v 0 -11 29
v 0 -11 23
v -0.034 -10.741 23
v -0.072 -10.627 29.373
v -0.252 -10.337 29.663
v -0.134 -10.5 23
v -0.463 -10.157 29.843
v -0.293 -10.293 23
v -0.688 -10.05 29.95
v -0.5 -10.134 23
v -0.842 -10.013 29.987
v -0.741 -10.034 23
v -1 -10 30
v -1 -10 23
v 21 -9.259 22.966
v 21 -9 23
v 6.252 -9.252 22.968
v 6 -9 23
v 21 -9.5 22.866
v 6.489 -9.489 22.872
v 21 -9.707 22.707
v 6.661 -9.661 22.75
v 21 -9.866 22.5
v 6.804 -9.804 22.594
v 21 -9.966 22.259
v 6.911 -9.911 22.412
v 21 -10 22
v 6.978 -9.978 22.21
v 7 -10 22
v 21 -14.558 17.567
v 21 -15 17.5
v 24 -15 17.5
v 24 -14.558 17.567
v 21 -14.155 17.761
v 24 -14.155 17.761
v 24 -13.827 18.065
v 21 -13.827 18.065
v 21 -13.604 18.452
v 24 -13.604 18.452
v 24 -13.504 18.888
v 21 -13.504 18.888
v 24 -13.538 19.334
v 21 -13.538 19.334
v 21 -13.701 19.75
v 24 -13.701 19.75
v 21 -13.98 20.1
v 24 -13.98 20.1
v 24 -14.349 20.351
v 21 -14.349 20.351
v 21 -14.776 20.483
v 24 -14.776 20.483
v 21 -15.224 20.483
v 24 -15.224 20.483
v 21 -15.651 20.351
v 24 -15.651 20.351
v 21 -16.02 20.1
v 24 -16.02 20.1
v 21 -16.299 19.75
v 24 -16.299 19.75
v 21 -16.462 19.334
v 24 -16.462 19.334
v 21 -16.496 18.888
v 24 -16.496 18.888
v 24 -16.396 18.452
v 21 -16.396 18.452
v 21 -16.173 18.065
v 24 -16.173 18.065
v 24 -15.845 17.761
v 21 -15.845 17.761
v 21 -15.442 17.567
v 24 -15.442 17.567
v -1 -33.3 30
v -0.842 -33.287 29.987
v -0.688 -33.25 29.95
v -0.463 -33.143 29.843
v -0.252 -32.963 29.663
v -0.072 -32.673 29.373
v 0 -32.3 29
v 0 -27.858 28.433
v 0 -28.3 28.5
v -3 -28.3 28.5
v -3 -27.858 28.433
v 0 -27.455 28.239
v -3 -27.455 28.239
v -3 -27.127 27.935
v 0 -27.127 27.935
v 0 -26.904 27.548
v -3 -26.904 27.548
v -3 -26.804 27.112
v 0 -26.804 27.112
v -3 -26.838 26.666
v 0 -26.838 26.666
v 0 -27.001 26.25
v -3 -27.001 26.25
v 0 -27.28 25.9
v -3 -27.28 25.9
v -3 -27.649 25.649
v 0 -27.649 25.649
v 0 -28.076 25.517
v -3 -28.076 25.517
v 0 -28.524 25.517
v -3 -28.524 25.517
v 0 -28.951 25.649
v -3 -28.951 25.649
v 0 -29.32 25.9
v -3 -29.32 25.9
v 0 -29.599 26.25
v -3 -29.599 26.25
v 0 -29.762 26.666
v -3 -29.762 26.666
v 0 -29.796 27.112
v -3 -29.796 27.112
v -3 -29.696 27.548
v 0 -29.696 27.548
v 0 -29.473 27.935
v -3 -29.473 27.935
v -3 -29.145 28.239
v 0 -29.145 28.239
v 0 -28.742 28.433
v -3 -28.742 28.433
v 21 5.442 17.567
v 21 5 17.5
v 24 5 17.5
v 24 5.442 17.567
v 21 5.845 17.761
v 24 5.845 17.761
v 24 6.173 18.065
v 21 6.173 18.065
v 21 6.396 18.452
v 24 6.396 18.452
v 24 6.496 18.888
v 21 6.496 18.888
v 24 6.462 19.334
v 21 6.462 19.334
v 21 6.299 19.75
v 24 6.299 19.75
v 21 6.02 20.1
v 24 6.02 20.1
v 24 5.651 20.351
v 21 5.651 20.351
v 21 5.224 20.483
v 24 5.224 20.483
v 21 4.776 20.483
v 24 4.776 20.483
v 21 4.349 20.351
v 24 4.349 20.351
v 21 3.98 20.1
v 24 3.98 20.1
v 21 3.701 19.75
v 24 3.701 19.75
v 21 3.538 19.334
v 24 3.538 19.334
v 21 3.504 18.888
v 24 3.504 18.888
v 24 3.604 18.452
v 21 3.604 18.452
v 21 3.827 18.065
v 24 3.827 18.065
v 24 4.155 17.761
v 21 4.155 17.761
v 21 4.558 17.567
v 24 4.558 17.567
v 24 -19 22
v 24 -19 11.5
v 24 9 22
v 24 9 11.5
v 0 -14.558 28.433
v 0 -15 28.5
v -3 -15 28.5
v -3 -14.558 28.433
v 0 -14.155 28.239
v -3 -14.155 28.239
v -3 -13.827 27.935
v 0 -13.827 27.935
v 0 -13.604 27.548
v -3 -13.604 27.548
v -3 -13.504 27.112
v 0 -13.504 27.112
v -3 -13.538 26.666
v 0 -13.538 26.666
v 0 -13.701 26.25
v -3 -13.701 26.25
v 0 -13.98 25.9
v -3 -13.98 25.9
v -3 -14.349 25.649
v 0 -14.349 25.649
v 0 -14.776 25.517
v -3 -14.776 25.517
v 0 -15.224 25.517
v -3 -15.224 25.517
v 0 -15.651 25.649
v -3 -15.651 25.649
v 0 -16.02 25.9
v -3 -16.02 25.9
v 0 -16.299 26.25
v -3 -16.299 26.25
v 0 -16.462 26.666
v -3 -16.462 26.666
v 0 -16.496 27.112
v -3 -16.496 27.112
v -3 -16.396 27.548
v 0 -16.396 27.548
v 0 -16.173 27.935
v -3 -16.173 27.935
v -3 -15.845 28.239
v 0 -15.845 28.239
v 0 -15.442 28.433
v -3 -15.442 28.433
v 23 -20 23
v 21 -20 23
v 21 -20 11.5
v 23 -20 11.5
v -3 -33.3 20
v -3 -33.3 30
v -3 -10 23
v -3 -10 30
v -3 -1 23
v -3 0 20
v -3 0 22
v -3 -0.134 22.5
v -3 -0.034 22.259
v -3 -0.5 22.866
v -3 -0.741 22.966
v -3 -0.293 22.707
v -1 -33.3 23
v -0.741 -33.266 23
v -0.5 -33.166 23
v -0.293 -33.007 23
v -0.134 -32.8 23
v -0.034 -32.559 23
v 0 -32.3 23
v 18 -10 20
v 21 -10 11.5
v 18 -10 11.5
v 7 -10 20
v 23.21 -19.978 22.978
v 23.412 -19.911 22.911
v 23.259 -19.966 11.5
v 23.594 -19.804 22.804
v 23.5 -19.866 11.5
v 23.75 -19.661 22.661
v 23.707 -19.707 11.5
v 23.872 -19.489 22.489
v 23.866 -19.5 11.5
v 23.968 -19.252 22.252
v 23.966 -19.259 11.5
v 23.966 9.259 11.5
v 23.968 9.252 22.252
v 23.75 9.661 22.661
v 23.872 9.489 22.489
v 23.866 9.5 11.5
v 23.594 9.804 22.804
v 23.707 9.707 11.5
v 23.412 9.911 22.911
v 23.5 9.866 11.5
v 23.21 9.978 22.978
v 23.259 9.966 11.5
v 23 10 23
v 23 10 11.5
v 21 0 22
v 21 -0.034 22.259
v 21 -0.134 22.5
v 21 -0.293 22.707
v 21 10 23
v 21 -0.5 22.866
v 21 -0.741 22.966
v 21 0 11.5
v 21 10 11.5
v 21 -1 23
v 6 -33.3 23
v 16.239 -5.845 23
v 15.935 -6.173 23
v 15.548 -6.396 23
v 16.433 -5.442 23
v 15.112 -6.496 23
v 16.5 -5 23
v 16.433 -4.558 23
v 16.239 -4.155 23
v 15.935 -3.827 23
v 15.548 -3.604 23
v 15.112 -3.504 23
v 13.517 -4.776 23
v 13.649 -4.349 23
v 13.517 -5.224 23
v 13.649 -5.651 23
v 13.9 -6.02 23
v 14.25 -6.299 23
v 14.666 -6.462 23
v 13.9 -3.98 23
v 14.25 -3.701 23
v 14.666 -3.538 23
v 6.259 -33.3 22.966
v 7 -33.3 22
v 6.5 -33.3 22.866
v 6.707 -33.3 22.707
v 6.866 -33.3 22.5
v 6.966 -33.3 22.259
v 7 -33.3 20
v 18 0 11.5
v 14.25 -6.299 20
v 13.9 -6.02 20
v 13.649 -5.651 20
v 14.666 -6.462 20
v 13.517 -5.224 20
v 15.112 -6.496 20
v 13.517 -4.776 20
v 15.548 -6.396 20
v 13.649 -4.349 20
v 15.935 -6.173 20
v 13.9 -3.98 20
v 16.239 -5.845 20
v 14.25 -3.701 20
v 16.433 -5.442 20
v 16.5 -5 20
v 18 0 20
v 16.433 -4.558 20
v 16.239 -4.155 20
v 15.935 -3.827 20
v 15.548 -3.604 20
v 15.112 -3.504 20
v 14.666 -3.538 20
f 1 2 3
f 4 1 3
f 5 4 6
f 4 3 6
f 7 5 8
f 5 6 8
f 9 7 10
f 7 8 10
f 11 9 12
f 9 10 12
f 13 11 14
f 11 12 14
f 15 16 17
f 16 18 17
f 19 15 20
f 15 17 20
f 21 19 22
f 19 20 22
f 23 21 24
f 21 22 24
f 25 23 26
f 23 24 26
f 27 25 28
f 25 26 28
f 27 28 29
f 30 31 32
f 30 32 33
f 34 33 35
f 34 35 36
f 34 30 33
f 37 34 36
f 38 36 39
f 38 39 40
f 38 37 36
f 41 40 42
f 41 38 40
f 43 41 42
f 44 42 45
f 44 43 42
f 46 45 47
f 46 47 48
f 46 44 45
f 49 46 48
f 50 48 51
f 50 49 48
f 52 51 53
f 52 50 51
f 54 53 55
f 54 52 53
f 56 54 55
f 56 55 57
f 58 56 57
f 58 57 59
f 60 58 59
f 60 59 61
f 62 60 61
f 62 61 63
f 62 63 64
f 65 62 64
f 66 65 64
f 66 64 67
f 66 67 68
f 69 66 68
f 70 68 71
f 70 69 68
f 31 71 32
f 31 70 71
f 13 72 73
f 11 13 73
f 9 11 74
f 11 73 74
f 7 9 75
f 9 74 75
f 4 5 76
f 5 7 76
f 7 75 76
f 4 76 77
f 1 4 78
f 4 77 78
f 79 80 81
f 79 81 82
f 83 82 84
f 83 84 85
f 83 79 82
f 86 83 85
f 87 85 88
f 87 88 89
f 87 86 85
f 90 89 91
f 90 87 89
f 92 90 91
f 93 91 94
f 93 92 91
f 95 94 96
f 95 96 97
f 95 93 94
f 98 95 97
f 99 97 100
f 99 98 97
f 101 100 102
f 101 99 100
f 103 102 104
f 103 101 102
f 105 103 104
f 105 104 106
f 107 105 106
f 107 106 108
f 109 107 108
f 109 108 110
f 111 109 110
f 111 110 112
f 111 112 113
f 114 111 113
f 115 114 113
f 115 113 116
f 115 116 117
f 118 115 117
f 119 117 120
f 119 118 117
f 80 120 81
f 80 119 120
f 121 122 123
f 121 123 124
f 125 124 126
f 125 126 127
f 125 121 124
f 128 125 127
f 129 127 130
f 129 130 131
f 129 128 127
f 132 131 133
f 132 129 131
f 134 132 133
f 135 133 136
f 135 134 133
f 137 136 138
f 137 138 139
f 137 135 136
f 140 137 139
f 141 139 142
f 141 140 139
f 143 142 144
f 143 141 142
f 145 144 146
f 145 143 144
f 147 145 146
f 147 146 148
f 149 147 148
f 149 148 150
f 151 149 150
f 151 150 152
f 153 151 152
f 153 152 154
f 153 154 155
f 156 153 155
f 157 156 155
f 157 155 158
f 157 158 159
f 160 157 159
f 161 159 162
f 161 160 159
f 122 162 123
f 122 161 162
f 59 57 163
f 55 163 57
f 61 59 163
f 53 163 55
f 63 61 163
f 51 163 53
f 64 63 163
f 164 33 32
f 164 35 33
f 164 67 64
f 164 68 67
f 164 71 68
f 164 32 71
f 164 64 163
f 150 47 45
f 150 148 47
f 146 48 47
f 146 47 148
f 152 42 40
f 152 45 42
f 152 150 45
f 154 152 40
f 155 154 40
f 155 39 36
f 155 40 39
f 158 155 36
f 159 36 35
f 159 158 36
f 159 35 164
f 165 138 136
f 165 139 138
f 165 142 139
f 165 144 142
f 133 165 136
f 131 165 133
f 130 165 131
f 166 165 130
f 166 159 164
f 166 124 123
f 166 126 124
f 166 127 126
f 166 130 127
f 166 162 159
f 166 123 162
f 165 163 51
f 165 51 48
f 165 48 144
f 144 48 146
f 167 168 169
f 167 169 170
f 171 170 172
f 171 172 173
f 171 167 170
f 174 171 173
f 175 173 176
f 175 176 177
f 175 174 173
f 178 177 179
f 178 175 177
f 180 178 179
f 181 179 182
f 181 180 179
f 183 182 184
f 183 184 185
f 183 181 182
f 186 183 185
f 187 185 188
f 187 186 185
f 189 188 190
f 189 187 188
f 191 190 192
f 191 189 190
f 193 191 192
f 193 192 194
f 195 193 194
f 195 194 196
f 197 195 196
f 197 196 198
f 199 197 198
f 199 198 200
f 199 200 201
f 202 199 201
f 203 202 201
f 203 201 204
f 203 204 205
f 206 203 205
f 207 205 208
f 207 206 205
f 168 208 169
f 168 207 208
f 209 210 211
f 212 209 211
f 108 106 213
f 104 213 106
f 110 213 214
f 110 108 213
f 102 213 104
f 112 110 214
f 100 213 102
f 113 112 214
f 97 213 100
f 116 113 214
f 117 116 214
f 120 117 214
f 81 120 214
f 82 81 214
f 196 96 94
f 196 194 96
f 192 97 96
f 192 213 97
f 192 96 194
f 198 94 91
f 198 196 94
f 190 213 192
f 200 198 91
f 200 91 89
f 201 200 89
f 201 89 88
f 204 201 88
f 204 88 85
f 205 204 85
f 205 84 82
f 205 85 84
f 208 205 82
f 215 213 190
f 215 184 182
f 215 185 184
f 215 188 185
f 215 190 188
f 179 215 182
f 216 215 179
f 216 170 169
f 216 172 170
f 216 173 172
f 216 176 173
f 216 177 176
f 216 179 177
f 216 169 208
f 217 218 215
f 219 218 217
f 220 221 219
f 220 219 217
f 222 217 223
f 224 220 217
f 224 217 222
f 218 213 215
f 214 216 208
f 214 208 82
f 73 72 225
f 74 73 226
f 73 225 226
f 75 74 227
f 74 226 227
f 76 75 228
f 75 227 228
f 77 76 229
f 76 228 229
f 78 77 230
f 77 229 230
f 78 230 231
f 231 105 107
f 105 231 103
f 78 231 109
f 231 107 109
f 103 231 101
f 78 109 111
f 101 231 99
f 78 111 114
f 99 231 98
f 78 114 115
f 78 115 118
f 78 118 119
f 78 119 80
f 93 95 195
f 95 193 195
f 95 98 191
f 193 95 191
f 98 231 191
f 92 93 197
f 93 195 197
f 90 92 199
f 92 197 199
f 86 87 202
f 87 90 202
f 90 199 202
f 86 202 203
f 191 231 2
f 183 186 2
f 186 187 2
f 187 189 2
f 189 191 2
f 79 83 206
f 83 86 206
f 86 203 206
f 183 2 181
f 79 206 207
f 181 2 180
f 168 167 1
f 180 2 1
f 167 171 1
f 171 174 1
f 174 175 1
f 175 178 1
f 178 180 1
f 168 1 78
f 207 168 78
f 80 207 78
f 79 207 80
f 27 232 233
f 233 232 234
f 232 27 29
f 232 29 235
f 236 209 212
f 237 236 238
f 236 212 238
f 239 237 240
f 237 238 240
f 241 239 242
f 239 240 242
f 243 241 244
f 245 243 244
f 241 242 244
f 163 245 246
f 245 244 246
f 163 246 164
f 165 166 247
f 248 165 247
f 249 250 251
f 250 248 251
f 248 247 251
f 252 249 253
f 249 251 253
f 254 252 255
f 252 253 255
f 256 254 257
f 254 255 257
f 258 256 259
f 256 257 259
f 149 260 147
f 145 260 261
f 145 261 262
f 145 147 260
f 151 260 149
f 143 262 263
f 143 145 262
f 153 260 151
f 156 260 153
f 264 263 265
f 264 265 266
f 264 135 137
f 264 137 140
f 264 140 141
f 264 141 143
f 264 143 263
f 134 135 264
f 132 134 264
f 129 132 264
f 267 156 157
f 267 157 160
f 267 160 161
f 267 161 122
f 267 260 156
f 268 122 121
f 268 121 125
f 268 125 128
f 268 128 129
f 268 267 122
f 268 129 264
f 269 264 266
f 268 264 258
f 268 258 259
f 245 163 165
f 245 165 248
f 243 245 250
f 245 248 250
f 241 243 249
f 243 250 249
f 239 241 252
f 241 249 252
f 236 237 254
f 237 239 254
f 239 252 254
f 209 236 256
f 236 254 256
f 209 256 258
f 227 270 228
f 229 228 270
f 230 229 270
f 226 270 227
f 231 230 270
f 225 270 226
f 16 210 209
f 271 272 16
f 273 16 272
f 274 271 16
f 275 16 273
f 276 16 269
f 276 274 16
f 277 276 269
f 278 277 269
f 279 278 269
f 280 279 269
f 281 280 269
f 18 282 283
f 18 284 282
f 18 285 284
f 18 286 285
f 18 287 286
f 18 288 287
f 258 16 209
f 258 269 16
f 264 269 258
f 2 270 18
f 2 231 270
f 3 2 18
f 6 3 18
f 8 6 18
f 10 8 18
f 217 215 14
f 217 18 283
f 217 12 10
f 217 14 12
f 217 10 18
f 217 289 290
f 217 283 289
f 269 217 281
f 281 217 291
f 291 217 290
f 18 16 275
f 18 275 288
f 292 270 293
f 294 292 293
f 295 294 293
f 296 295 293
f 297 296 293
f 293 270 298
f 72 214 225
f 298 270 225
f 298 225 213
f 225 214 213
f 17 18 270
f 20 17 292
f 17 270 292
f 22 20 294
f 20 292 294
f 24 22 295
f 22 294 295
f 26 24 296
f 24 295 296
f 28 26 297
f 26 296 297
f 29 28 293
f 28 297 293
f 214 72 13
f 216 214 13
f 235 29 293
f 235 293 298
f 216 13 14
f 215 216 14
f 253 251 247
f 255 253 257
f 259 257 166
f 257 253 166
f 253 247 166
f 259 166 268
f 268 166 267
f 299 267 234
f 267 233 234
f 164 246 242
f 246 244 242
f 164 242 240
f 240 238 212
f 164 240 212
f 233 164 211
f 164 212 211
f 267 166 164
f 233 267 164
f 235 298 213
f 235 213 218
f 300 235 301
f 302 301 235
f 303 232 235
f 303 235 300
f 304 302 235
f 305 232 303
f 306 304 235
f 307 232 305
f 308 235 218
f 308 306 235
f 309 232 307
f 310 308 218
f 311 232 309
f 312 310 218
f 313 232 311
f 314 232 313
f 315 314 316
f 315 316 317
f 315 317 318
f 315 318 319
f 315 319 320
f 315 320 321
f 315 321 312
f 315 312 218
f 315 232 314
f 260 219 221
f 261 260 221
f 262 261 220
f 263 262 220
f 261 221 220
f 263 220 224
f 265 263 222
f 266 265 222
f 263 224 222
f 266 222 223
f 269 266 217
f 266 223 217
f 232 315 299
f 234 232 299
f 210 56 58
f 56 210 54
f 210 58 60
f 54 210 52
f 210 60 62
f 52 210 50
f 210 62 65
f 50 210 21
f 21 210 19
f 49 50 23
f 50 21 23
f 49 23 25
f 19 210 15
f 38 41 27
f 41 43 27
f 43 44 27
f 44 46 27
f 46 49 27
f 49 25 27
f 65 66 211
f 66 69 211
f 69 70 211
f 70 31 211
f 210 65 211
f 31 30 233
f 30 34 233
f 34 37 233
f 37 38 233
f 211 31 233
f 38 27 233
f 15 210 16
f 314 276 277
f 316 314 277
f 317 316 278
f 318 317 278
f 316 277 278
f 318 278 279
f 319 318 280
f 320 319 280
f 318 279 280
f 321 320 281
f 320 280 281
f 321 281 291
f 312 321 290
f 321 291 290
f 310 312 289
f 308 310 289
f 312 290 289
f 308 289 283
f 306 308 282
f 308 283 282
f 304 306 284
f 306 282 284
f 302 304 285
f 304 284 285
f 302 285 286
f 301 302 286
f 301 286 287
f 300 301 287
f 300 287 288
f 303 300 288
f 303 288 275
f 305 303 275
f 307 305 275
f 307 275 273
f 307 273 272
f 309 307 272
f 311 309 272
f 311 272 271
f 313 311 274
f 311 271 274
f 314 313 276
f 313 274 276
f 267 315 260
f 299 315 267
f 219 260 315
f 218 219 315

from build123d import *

# Parameters (mm, degrees)
CROQUIS1_W              = 23
CROQUIS1_H              = 33.3
SALIENTE_EXTRUIR2_DEPTH = 7
CROQUIS3_W              = 4
CROQUIS3_H              = 19
CORTAR_EXTRUIR1_DEPTH   = 42.071766458
CROQUIS7_R              = 1.5
SALIENTE_EXTRUIR3_DEPTH = 3
CROQUIS8_W              = 18
CROQUIS8_H              = 10
CROQUIS8_R              = 1.5
SALIENTE_EXTRUIR5_DEPTH = 3
SALIENTE_EXTRUIR6_START = -1
CROQUIS9_W              = 18
CROQUIS9_H              = 10
CROQUIS9_R              = 1.5
SALIENTE_EXTRUIR6_DEPTH = 1
CROQUIS10_W             = 23
CROQUIS10_H             = 10
SALIENTE_EXTRUIR7_DEPTH = 3
CROQUIS11_W             = 19
CROQUIS11_H             = 38
CORTAR_EXTRUIR5_DEPTH   = 57.449003534
CROQUIS15_W             = 7
CROQUIS15_H             = 10
CORTAR_EXTRUIR8_DEPTH   = 58.475994989
CROQUIS16_W             = 7
CROQUIS16_H             = 16
CORTAR_EXTRUIR9_DEPTH   = 1
CROQUIS18_W             = 23
CROQUIS18_H             = 10
CROQUIS18_R             = 1.5
SALIENTE_EXTRUIR8_DEPTH = 3
REDONDEO1_R             = 1
CROQUIS19_W             = 2
CROQUIS19_H             = 11.5
CORTAR_EXTRUIR10_DEPTH  = 67.516839973
CROQUIS20_W             = 11.5
CROQUIS20_H             = 11
CORTAR_EXTRUIR11_DEPTH  = 60.929041374


with BuildPart() as part:
    # Croquis1 → Saliente-Extruir2 (new body)
    with BuildSketch(Plane(origin=(0, 0, 0), x_dir=(0, 0, -1), z_dir=(1, 0, 0))):
        with Locations((-11.5, -16.65)):
            Rectangle(CROQUIS1_W, CROQUIS1_H)
    extrude(amount=SALIENTE_EXTRUIR2_DEPTH)

    # Croquis3 → Cortar-Extruir1 (cut, through all)
    with BuildSketch(Plane(origin=(0, 0, 0), x_dir=(1, 0, 0), z_dir=(0, 1, 0))):
        with Locations((5, -10.5)):
            Rectangle(CROQUIS3_W, CROQUIS3_H)
    extrude(amount=-CORTAR_EXTRUIR1_DEPTH, mode=Mode.SUBTRACT)



with BuildPart() as body_2:
    # Croquis7 → Saliente-Extruir3 (new body)
    with BuildSketch(Plane.ZY):
        Polygon((-7, 0), (-7, -33.3), (0, -33.3), (0, -44.3), (23, -44.3), (23, -33.3), (30, -33.3), (30, 0), align=None)
        with Locations((-4, -28.3)):
            Circle(CROQUIS7_R, mode=Mode.SUBTRACT)
        with Locations((-4, -15)):
            Circle(CROQUIS7_R, mode=Mode.SUBTRACT)
        with Locations((27, -15)):
            Circle(CROQUIS7_R, mode=Mode.SUBTRACT)
        with Locations((27, -28.3)):
            Circle(CROQUIS7_R, mode=Mode.SUBTRACT)
        with Locations((19, -40.3)):
            Circle(CROQUIS7_R, mode=Mode.SUBTRACT)
        with Locations((4, -40.3)):
            Circle(CROQUIS7_R, mode=Mode.SUBTRACT)
    extrude(amount=SALIENTE_EXTRUIR3_DEPTH)


with BuildPart() as part_1:
    add(part.part)

    add(body_2.part)  # Saliente-Extruir5 merges body 2
    # Croquis8 → Saliente-Extruir5 (add)
    with BuildSketch(Plane.XY.offset(23)):
        with Locations((9, -5)):
            Rectangle(CROQUIS8_W, CROQUIS8_H)
        with Locations((15, -5)):
            Circle(CROQUIS8_R, mode=Mode.SUBTRACT)
        with Locations((3, -5)):
            Circle(CROQUIS8_R, mode=Mode.SUBTRACT)
    extrude(amount=-SALIENTE_EXTRUIR5_DEPTH)

    # Croquis9 → Saliente-Extruir6 (add)
    with BuildSketch(Plane(origin=(0, 0, 0), x_dir=(-1, 0, 0), z_dir=(0, 0, -1)).offset(SALIENTE_EXTRUIR6_START)):
        with Locations((-9, -5)):
            Rectangle(CROQUIS9_W, CROQUIS9_H)
        with Locations(Location((-15, -5, 0), (0, 0, 180))):
            Circle(CROQUIS9_R, mode=Mode.SUBTRACT)
    extrude(amount=SALIENTE_EXTRUIR6_DEPTH)

    # Croquis10 → Saliente-Extruir7 (add)
    with BuildSketch(Plane(origin=(18, 0, 0), x_dir=(0, 0, -1), z_dir=(1, 0, 0))):
        with Locations((-11.5, -5)):
            Rectangle(CROQUIS10_W, CROQUIS10_H)
    extrude(amount=SALIENTE_EXTRUIR7_DEPTH)

    # Croquis11 → Cortar-Extruir5 (cut, through all)
    with BuildSketch(Plane(origin=(3, 0, 0), x_dir=(0, 0, -1), z_dir=(1, 0, 0))):
        with Locations((-10.5, -19)):
            Rectangle(CROQUIS11_W, CROQUIS11_H)
    extrude(amount=-CORTAR_EXTRUIR5_DEPTH, mode=Mode.SUBTRACT)

    # Croquis15 → Cortar-Extruir8 (cut, through all)
    with BuildSketch(Plane(origin=(0, 0, 0), x_dir=(0, 0, -1), z_dir=(1, 0, 0))):
        with Locations((-26.5, -5)):
            Rectangle(CROQUIS15_W, CROQUIS15_H)
        with Locations((3.5, -5)):
            Rectangle(CROQUIS15_W, CROQUIS15_H)
    extrude(amount=-CORTAR_EXTRUIR8_DEPTH, mode=Mode.SUBTRACT)

    # Croquis16 → Cortar-Extruir9 (cut)
    with BuildSketch(Plane(origin=(0, 0, 0), x_dir=(-1, 0, 0), z_dir=(0, 0, -1))):
        with Locations((-3.5, -25.3)):
            Rectangle(CROQUIS16_W, CROQUIS16_H)
    extrude(amount=-CORTAR_EXTRUIR9_DEPTH, mode=Mode.SUBTRACT)

    # Croquis18 → Saliente-Extruir8 (add)
    # profile 1 of 3: a face of its own
    with BuildSketch(Plane(origin=(21, 0, 0), x_dir=(0, 0, -1), z_dir=(1, 0, 0))):
        with Locations((-11.5, 5)):
            Rectangle(CROQUIS18_W, CROQUIS18_H)
        with Locations((-19, 5)):
            Circle(CROQUIS18_R, mode=Mode.SUBTRACT)
        with Locations((-4, 5)):
            Circle(CROQUIS18_R, mode=Mode.SUBTRACT)
    # profile 2 of 3: a face of its own
    with BuildSketch(Plane(origin=(21, 0, 0), x_dir=(0, 0, -1), z_dir=(1, 0, 0))):
        with Locations((-11.5, -5)):
            Rectangle(CROQUIS18_W, CROQUIS18_H)
    # profile 3 of 3: a face of its own
    with BuildSketch(Plane(origin=(21, 0, 0), x_dir=(0, 0, -1), z_dir=(1, 0, 0))):
        with Locations((-11.5, -15)):
            Rectangle(CROQUIS18_W, CROQUIS18_H)
        with Locations((-4, -15)):
            Circle(CROQUIS18_R, mode=Mode.SUBTRACT)
        with Locations((-19, -15)):
            Circle(CROQUIS18_R, mode=Mode.SUBTRACT)
    extrude(amount=SALIENTE_EXTRUIR8_DEPTH)

    # Redondeo1
    # the kernel refuses this fillet: 1 mm, written as the material it takes off along each edge
    with BuildSketch(Plane(origin=(0, -33.3, 30), x_dir=(-1, 0, 0), z_dir=(0, 1, 0)), Plane(origin=(7, -33.3, 23), x_dir=(-1, 0, 0), z_dir=(0, 1, 0))) as redondeo1_piece_1:
        with BuildLine():
            CenterArc((REDONDEO1_R, -REDONDEO1_R), REDONDEO1_R, 90, 90)
            Line((0, -REDONDEO1_R), (-REDONDEO1_R * 0.02, -REDONDEO1_R))
            Line((-REDONDEO1_R * 0.02, -REDONDEO1_R), (-REDONDEO1_R * 0.02, REDONDEO1_R * 0.02))
            Line((-REDONDEO1_R * 0.02, REDONDEO1_R * 0.02), (REDONDEO1_R, REDONDEO1_R * 0.02))
            Line((REDONDEO1_R, REDONDEO1_R * 0.02), (REDONDEO1_R, 0))
        make_face()
    extrude(amount=23.3, mode=Mode.SUBTRACT)
    with BuildSketch(Plane(origin=(0, -10, 23), x_dir=(-1, 0, 0), z_dir=(0, 0, 1)), Plane(origin=(0, -10, -7), x_dir=(-1, 0, 0), z_dir=(0, 0, 1)), Plane(origin=(0, -33.3, -7), x_dir=(0, 1, 0), z_dir=(0, 0, 1))) as redondeo1_piece_2:
        with BuildLine():
            CenterArc((REDONDEO1_R, REDONDEO1_R), REDONDEO1_R, 180, 90)
            Line((0, REDONDEO1_R), (-REDONDEO1_R * 0.02, REDONDEO1_R))
            Line((-REDONDEO1_R * 0.02, REDONDEO1_R), (-REDONDEO1_R * 0.02, -REDONDEO1_R * 0.02))
            Line((-REDONDEO1_R * 0.02, -REDONDEO1_R * 0.02), (REDONDEO1_R, -REDONDEO1_R * 0.02))
            Line((REDONDEO1_R, -REDONDEO1_R * 0.02), (REDONDEO1_R, 0))
        make_face()
    extrude(amount=7, mode=Mode.SUBTRACT)
    with BuildSketch(Plane(origin=(24, 10, 23), x_dir=(0, 0, -1), z_dir=(0, -1, 0)), Plane(origin=(24, 10, 0), x_dir=(-1, 0, 0), z_dir=(0, -1, 0))) as redondeo1_piece_3:
        with BuildLine():
            CenterArc((REDONDEO1_R, -REDONDEO1_R), REDONDEO1_R, 90, 90)
            Line((0, -REDONDEO1_R), (-REDONDEO1_R * 0.02, -REDONDEO1_R))
            Line((-REDONDEO1_R * 0.02, -REDONDEO1_R), (-REDONDEO1_R * 0.02, REDONDEO1_R * 0.02))
            Line((-REDONDEO1_R * 0.02, REDONDEO1_R * 0.02), (REDONDEO1_R, REDONDEO1_R * 0.02))
            Line((REDONDEO1_R, REDONDEO1_R * 0.02), (REDONDEO1_R, 0))
        make_face()
    extrude(amount=30, mode=Mode.SUBTRACT)
    with BuildSketch(Plane(origin=(24, 10, 0), x_dir=(-1, 0, 0), z_dir=(0, 0, 1)), Plane(origin=(0, -44.3, 0), x_dir=(0, 1, 0), z_dir=(0, 0, 1))) as redondeo1_piece_4:
        with BuildLine():
            CenterArc((REDONDEO1_R, REDONDEO1_R), REDONDEO1_R, 180, 90)
            Line((0, REDONDEO1_R), (-REDONDEO1_R * 0.02, REDONDEO1_R))
            Line((-REDONDEO1_R * 0.02, REDONDEO1_R), (-REDONDEO1_R * 0.02, -REDONDEO1_R * 0.02))
            Line((-REDONDEO1_R * 0.02, -REDONDEO1_R * 0.02), (REDONDEO1_R, -REDONDEO1_R * 0.02))
            Line((REDONDEO1_R, -REDONDEO1_R * 0.02), (REDONDEO1_R, 0))
        make_face()
    extrude(amount=23, mode=Mode.SUBTRACT)
    with BuildSketch(Plane(origin=(24, -20, 0), x_dir=(-1, 0, 0), z_dir=(0, 0, 1))) as redondeo1_piece_5:
        with BuildLine():
            CenterArc((REDONDEO1_R, -REDONDEO1_R), REDONDEO1_R, 90, 90)
            Line((0, -REDONDEO1_R), (-REDONDEO1_R * 0.02, -REDONDEO1_R))
            Line((-REDONDEO1_R * 0.02, -REDONDEO1_R), (-REDONDEO1_R * 0.02, REDONDEO1_R * 0.02))
            Line((-REDONDEO1_R * 0.02, REDONDEO1_R * 0.02), (REDONDEO1_R, REDONDEO1_R * 0.02))
            Line((REDONDEO1_R, REDONDEO1_R * 0.02), (REDONDEO1_R, 0))
        make_face()
    extrude(amount=23, mode=Mode.SUBTRACT)
    with BuildSketch(Plane(origin=(7, -10, 23), x_dir=(0, 1, 0), z_dir=(1, 0, 0))) as redondeo1_piece_6:
        with BuildLine():
            CenterArc((REDONDEO1_R, -REDONDEO1_R), REDONDEO1_R, 90, 90)
            Line((0, -REDONDEO1_R), (-REDONDEO1_R * 0.02, -REDONDEO1_R))
            Line((-REDONDEO1_R * 0.02, -REDONDEO1_R), (-REDONDEO1_R * 0.02, REDONDEO1_R * 0.02))
            Line((-REDONDEO1_R * 0.02, REDONDEO1_R * 0.02), (REDONDEO1_R, REDONDEO1_R * 0.02))
            Line((REDONDEO1_R, REDONDEO1_R * 0.02), (REDONDEO1_R, 0))
        make_face()
    extrude(amount=14, mode=Mode.SUBTRACT)
    with BuildSketch(Plane(origin=(0, -33.3, 0), x_dir=(0, 0, 1), z_dir=(0, -1, 0))) as redondeo1_piece_7:
        with BuildLine():
            CenterArc((REDONDEO1_R, REDONDEO1_R), REDONDEO1_R, 180, 90)
            Line((0, REDONDEO1_R), (-REDONDEO1_R * 0.02, REDONDEO1_R))
            Line((-REDONDEO1_R * 0.02, REDONDEO1_R), (-REDONDEO1_R * 0.02, -REDONDEO1_R * 0.02))
            Line((-REDONDEO1_R * 0.02, -REDONDEO1_R * 0.02), (REDONDEO1_R, -REDONDEO1_R * 0.02))
            Line((REDONDEO1_R, -REDONDEO1_R * 0.02), (REDONDEO1_R, 0))
        make_face()
    extrude(amount=11, mode=Mode.SUBTRACT)
    with BuildSketch(Plane(origin=(0, -33.3, 23), x_dir=(-1, 0, 0), z_dir=(0, 0, 1))) as redondeo1_piece_8:
        with BuildLine():
            CenterArc((REDONDEO1_R, -REDONDEO1_R), REDONDEO1_R, 90, 90)
            Line((0, -REDONDEO1_R), (-REDONDEO1_R * 0.02, -REDONDEO1_R))
            Line((-REDONDEO1_R * 0.02, -REDONDEO1_R), (-REDONDEO1_R * 0.02, REDONDEO1_R * 0.02))
            Line((-REDONDEO1_R * 0.02, REDONDEO1_R * 0.02), (REDONDEO1_R, REDONDEO1_R * 0.02))
            Line((REDONDEO1_R, REDONDEO1_R * 0.02), (REDONDEO1_R, 0))
        make_face()
    extrude(amount=7, mode=Mode.SUBTRACT)
    with BuildSketch(Plane(origin=(-3, 0, 23), x_dir=(0, -1, 0), z_dir=(1, 0, 0)), Plane(origin=(21, 0, 0), x_dir=(0, -1, 0), z_dir=(-1, 0, 0))) as redondeo1_piece_9:
        with BuildLine():
            CenterArc((REDONDEO1_R, REDONDEO1_R), REDONDEO1_R, 180, 90)
            Line((0, REDONDEO1_R), (-REDONDEO1_R * 0.02, REDONDEO1_R))
            Line((-REDONDEO1_R * 0.02, REDONDEO1_R), (-REDONDEO1_R * 0.02, -REDONDEO1_R * 0.02))
            Line((-REDONDEO1_R * 0.02, -REDONDEO1_R * 0.02), (REDONDEO1_R, -REDONDEO1_R * 0.02))
            Line((REDONDEO1_R, -REDONDEO1_R * 0.02), (REDONDEO1_R, 0))
        make_face()
    extrude(amount=24, mode=Mode.SUBTRACT)
    with BuildSketch(Plane(origin=(0, -10, -7), x_dir=(0, 0, 1), z_dir=(0, -1, 0))) as redondeo1_piece_10:
        with BuildLine():
            CenterArc((REDONDEO1_R, REDONDEO1_R), REDONDEO1_R, 180, 90)
            Line((0, REDONDEO1_R), (-REDONDEO1_R * 0.02, REDONDEO1_R))
            Line((-REDONDEO1_R * 0.02, REDONDEO1_R), (-REDONDEO1_R * 0.02, -REDONDEO1_R * 0.02))
            Line((-REDONDEO1_R * 0.02, -REDONDEO1_R * 0.02), (REDONDEO1_R, -REDONDEO1_R * 0.02))
            Line((REDONDEO1_R, -REDONDEO1_R * 0.02), (REDONDEO1_R, 0))
        make_face()
    extrude(amount=23.3, mode=Mode.SUBTRACT)
    with BuildSketch(Plane(origin=(0, -33.3, 23), x_dir=(-1, 0, 0), z_dir=(0, 0, 1))) as redondeo1_piece_11a_section:
        with BuildLine():
            CenterArc((REDONDEO1_R, -REDONDEO1_R), REDONDEO1_R, 90, 90)
            Line((0, -REDONDEO1_R), (-REDONDEO1_R * 0.02, -REDONDEO1_R))
            Line((-REDONDEO1_R * 0.02, -REDONDEO1_R), (-REDONDEO1_R * 0.02, REDONDEO1_R * 0.02))
            Line((-REDONDEO1_R * 0.02, REDONDEO1_R * 0.02), (REDONDEO1_R, REDONDEO1_R * 0.02))
            Line((REDONDEO1_R, REDONDEO1_R * 0.02), (REDONDEO1_R, 0))
        make_face()
    redondeo1_piece_11a = extrude(amount=9.5, mode=Mode.PRIVATE)
    redondeo1_piece_11a = split(redondeo1_piece_11a, bisect_by=Plane(origin=(-0.226395114, -33.073604886, 30), z_dir=(0, 0, 1)), keep=Keep.TOP, mode=Mode.PRIVATE)
    with BuildSketch(Plane(origin=(0, -35.8, 30), x_dir=(-1, 0, 0), z_dir=(0, 1, 0))) as redondeo1_piece_11b_section:
        with BuildLine():
            CenterArc((REDONDEO1_R, -REDONDEO1_R), REDONDEO1_R, 90, 90)
            Line((0, -REDONDEO1_R), (-REDONDEO1_R * 0.02, -REDONDEO1_R))
            Line((-REDONDEO1_R * 0.02, -REDONDEO1_R), (-REDONDEO1_R * 0.02, REDONDEO1_R * 0.02))
            Line((-REDONDEO1_R * 0.02, REDONDEO1_R * 0.02), (REDONDEO1_R, REDONDEO1_R * 0.02))
            Line((REDONDEO1_R, REDONDEO1_R * 0.02), (REDONDEO1_R, 0))
        make_face()
    redondeo1_piece_11b = extrude(amount=25.8, mode=Mode.PRIVATE)
    redondeo1_piece_11b = split(redondeo1_piece_11b, bisect_by=Plane(origin=(-0.226395114, -33.3, 29.773604886), z_dir=(0, -1, 0)), keep=Keep.TOP, mode=Mode.PRIVATE)
    redondeo1_piece_11 = redondeo1_piece_11a & redondeo1_piece_11b
    add(redondeo1_piece_11, mode=Mode.SUBTRACT)
    with BuildSketch(Plane(origin=(0, -10, 23), x_dir=(-1, 0, 0), z_dir=(0, 0, 1))) as redondeo1_piece_12a_section:
        with BuildLine():
            CenterArc((REDONDEO1_R, REDONDEO1_R), REDONDEO1_R, 180, 90)
            Line((0, REDONDEO1_R), (-REDONDEO1_R * 0.02, REDONDEO1_R))
            Line((-REDONDEO1_R * 0.02, REDONDEO1_R), (-REDONDEO1_R * 0.02, -REDONDEO1_R * 0.02))
            Line((-REDONDEO1_R * 0.02, -REDONDEO1_R * 0.02), (REDONDEO1_R, -REDONDEO1_R * 0.02))
            Line((REDONDEO1_R, -REDONDEO1_R * 0.02), (REDONDEO1_R, 0))
        make_face()
    redondeo1_piece_12a = extrude(amount=9.5, mode=Mode.PRIVATE)
    redondeo1_piece_12a = split(redondeo1_piece_12a, bisect_by=Plane(origin=(-0.226395114, -10.226395114, 30), z_dir=(0, 0, 1)), keep=Keep.TOP, mode=Mode.PRIVATE)
    with BuildSketch(Plane(origin=(0, -33.3, 30), x_dir=(-1, 0, 0), z_dir=(0, 1, 0))) as redondeo1_piece_12b_section:
        with BuildLine():
            CenterArc((REDONDEO1_R, -REDONDEO1_R), REDONDEO1_R, 90, 90)
            Line((0, -REDONDEO1_R), (-REDONDEO1_R * 0.02, -REDONDEO1_R))
            Line((-REDONDEO1_R * 0.02, -REDONDEO1_R), (-REDONDEO1_R * 0.02, REDONDEO1_R * 0.02))
            Line((-REDONDEO1_R * 0.02, REDONDEO1_R * 0.02), (REDONDEO1_R, REDONDEO1_R * 0.02))
            Line((REDONDEO1_R, REDONDEO1_R * 0.02), (REDONDEO1_R, 0))
        make_face()
    redondeo1_piece_12b = extrude(amount=25.8, mode=Mode.PRIVATE)
    redondeo1_piece_12b = split(redondeo1_piece_12b, bisect_by=Plane(origin=(-0.226395114, -10, 29.773604886), z_dir=(0, 1, 0)), keep=Keep.TOP, mode=Mode.PRIVATE)
    redondeo1_piece_12 = redondeo1_piece_12a & redondeo1_piece_12b
    add(redondeo1_piece_12, mode=Mode.SUBTRACT)
    with BuildSketch(Plane(origin=(24, 10, 0), x_dir=(-1, 0, 0), z_dir=(0, 0, 1))) as redondeo1_piece_13a_section:
        with BuildLine():
            CenterArc((REDONDEO1_R, REDONDEO1_R), REDONDEO1_R, 180, 90)
            Line((0, REDONDEO1_R), (-REDONDEO1_R * 0.02, REDONDEO1_R))
            Line((-REDONDEO1_R * 0.02, REDONDEO1_R), (-REDONDEO1_R * 0.02, -REDONDEO1_R * 0.02))
            Line((-REDONDEO1_R * 0.02, -REDONDEO1_R * 0.02), (REDONDEO1_R, -REDONDEO1_R * 0.02))
            Line((REDONDEO1_R, -REDONDEO1_R * 0.02), (REDONDEO1_R, 0))
        make_face()
    redondeo1_piece_13a = extrude(amount=25.5, mode=Mode.PRIVATE)
    redondeo1_piece_13a = split(redondeo1_piece_13a, bisect_by=Plane(origin=(23.773604886, 9.773604886, 23), z_dir=(0, 0, 1)), keep=Keep.TOP, mode=Mode.PRIVATE)
    with BuildSketch(Plane(origin=(24, 12.5, 23), x_dir=(0, 0, -1), z_dir=(0, -1, 0))) as redondeo1_piece_13b_section:
        with BuildLine():
            CenterArc((REDONDEO1_R, -REDONDEO1_R), REDONDEO1_R, 90, 90)
            Line((0, -REDONDEO1_R), (-REDONDEO1_R * 0.02, -REDONDEO1_R))
            Line((-REDONDEO1_R * 0.02, -REDONDEO1_R), (-REDONDEO1_R * 0.02, REDONDEO1_R * 0.02))
            Line((-REDONDEO1_R * 0.02, REDONDEO1_R * 0.02), (REDONDEO1_R, REDONDEO1_R * 0.02))
            Line((REDONDEO1_R, REDONDEO1_R * 0.02), (REDONDEO1_R, 0))
        make_face()
    redondeo1_piece_13b = extrude(amount=32.5, mode=Mode.PRIVATE)
    redondeo1_piece_13b = split(redondeo1_piece_13b, bisect_by=Plane(origin=(23.773604886, 10, 22.773604886), z_dir=(0, 1, 0)), keep=Keep.TOP, mode=Mode.PRIVATE)
    redondeo1_piece_13 = redondeo1_piece_13a & redondeo1_piece_13b
    add(redondeo1_piece_13, mode=Mode.SUBTRACT)
    with BuildSketch(Plane(origin=(24, -20, 0), x_dir=(-1, 0, 0), z_dir=(0, 0, 1))) as redondeo1_piece_14a_section:
        with BuildLine():
            CenterArc((REDONDEO1_R, -REDONDEO1_R), REDONDEO1_R, 90, 90)
            Line((0, -REDONDEO1_R), (-REDONDEO1_R * 0.02, -REDONDEO1_R))
            Line((-REDONDEO1_R * 0.02, -REDONDEO1_R), (-REDONDEO1_R * 0.02, REDONDEO1_R * 0.02))
            Line((-REDONDEO1_R * 0.02, REDONDEO1_R * 0.02), (REDONDEO1_R, REDONDEO1_R * 0.02))
            Line((REDONDEO1_R, REDONDEO1_R * 0.02), (REDONDEO1_R, 0))
        make_face()
    redondeo1_piece_14a = extrude(amount=25.5, mode=Mode.PRIVATE)
    redondeo1_piece_14a = split(redondeo1_piece_14a, bisect_by=Plane(origin=(23.773604886, -19.773604886, 23), z_dir=(0, 0, 1)), keep=Keep.TOP, mode=Mode.PRIVATE)
    with BuildSketch(Plane(origin=(24, 10, 23), x_dir=(0, 0, -1), z_dir=(0, -1, 0))) as redondeo1_piece_14b_section:
        with BuildLine():
            CenterArc((REDONDEO1_R, -REDONDEO1_R), REDONDEO1_R, 90, 90)
            Line((0, -REDONDEO1_R), (-REDONDEO1_R * 0.02, -REDONDEO1_R))
            Line((-REDONDEO1_R * 0.02, -REDONDEO1_R), (-REDONDEO1_R * 0.02, REDONDEO1_R * 0.02))
            Line((-REDONDEO1_R * 0.02, REDONDEO1_R * 0.02), (REDONDEO1_R, REDONDEO1_R * 0.02))
            Line((REDONDEO1_R, REDONDEO1_R * 0.02), (REDONDEO1_R, 0))
        make_face()
    redondeo1_piece_14b = extrude(amount=32.5, mode=Mode.PRIVATE)
    redondeo1_piece_14b = split(redondeo1_piece_14b, bisect_by=Plane(origin=(23.773604886, -20, 22.773604886), z_dir=(0, -1, 0)), keep=Keep.TOP, mode=Mode.PRIVATE)
    redondeo1_piece_14 = redondeo1_piece_14a & redondeo1_piece_14b
    add(redondeo1_piece_14, mode=Mode.SUBTRACT)
    with BuildSketch(Plane(origin=(24, 12.5, 0), x_dir=(-1, 0, 0), z_dir=(0, -1, 0))) as redondeo1_piece_15a_section:
        with BuildLine():
            CenterArc((REDONDEO1_R, -REDONDEO1_R), REDONDEO1_R, 90, 90)
            Line((0, -REDONDEO1_R), (-REDONDEO1_R * 0.02, -REDONDEO1_R))
            Line((-REDONDEO1_R * 0.02, -REDONDEO1_R), (-REDONDEO1_R * 0.02, REDONDEO1_R * 0.02))
            Line((-REDONDEO1_R * 0.02, REDONDEO1_R * 0.02), (REDONDEO1_R, REDONDEO1_R * 0.02))
            Line((REDONDEO1_R, REDONDEO1_R * 0.02), (REDONDEO1_R, 0))
        make_face()
    redondeo1_piece_15a = extrude(amount=32.5, mode=Mode.PRIVATE)
    redondeo1_piece_15a = split(redondeo1_piece_15a, bisect_by=Plane(origin=(23.773604886, 10, 0.226395114), z_dir=(0, 1, 0)), keep=Keep.TOP, mode=Mode.PRIVATE)
    with BuildSketch(Plane(origin=(24, 10, -2.5), x_dir=(-1, 0, 0), z_dir=(0, 0, 1))) as redondeo1_piece_15b_section:
        with BuildLine():
            CenterArc((REDONDEO1_R, REDONDEO1_R), REDONDEO1_R, 180, 90)
            Line((0, REDONDEO1_R), (-REDONDEO1_R * 0.02, REDONDEO1_R))
            Line((-REDONDEO1_R * 0.02, REDONDEO1_R), (-REDONDEO1_R * 0.02, -REDONDEO1_R * 0.02))
            Line((-REDONDEO1_R * 0.02, -REDONDEO1_R * 0.02), (REDONDEO1_R, -REDONDEO1_R * 0.02))
            Line((REDONDEO1_R, -REDONDEO1_R * 0.02), (REDONDEO1_R, 0))
        make_face()
    redondeo1_piece_15b = extrude(amount=25.5, mode=Mode.PRIVATE)
    redondeo1_piece_15b = split(redondeo1_piece_15b, bisect_by=Plane(origin=(23.773604886, 9.773604886, 0), z_dir=(0, 0, -1)), keep=Keep.TOP, mode=Mode.PRIVATE)
    redondeo1_piece_15 = redondeo1_piece_15a & redondeo1_piece_15b
    add(redondeo1_piece_15, mode=Mode.SUBTRACT)
    with BuildSketch(Plane(origin=(24, 10, 0), x_dir=(-1, 0, 0), z_dir=(0, -1, 0))) as redondeo1_piece_16a_section:
        with BuildLine():
            CenterArc((REDONDEO1_R, -REDONDEO1_R), REDONDEO1_R, 90, 90)
            Line((0, -REDONDEO1_R), (-REDONDEO1_R * 0.02, -REDONDEO1_R))
            Line((-REDONDEO1_R * 0.02, -REDONDEO1_R), (-REDONDEO1_R * 0.02, REDONDEO1_R * 0.02))
            Line((-REDONDEO1_R * 0.02, REDONDEO1_R * 0.02), (REDONDEO1_R, REDONDEO1_R * 0.02))
            Line((REDONDEO1_R, REDONDEO1_R * 0.02), (REDONDEO1_R, 0))
        make_face()
    redondeo1_piece_16a = extrude(amount=32.5, mode=Mode.PRIVATE)
    redondeo1_piece_16a = split(redondeo1_piece_16a, bisect_by=Plane(origin=(23.773604886, -20, 0.226395114), z_dir=(0, -1, 0)), keep=Keep.TOP, mode=Mode.PRIVATE)
    with BuildSketch(Plane(origin=(24, -20, -2.5), x_dir=(-1, 0, 0), z_dir=(0, 0, 1))) as redondeo1_piece_16b_section:
        with BuildLine():
            CenterArc((REDONDEO1_R, -REDONDEO1_R), REDONDEO1_R, 90, 90)
            Line((0, -REDONDEO1_R), (-REDONDEO1_R * 0.02, -REDONDEO1_R))
            Line((-REDONDEO1_R * 0.02, -REDONDEO1_R), (-REDONDEO1_R * 0.02, REDONDEO1_R * 0.02))
            Line((-REDONDEO1_R * 0.02, REDONDEO1_R * 0.02), (REDONDEO1_R, REDONDEO1_R * 0.02))
            Line((REDONDEO1_R, REDONDEO1_R * 0.02), (REDONDEO1_R, 0))
        make_face()
    redondeo1_piece_16b = extrude(amount=25.5, mode=Mode.PRIVATE)
    redondeo1_piece_16b = split(redondeo1_piece_16b, bisect_by=Plane(origin=(23.773604886, -19.773604886, 0), z_dir=(0, 0, -1)), keep=Keep.TOP, mode=Mode.PRIVATE)
    redondeo1_piece_16 = redondeo1_piece_16a & redondeo1_piece_16b
    add(redondeo1_piece_16, mode=Mode.SUBTRACT)
    with BuildSketch(Plane(origin=(4.5, -10, 23), x_dir=(0, 1, 0), z_dir=(1, 0, 0))) as redondeo1_piece_17a_section:
        with BuildLine():
            CenterArc((REDONDEO1_R, -REDONDEO1_R), REDONDEO1_R, 90, 90)
            Line((0, -REDONDEO1_R), (-REDONDEO1_R * 0.02, -REDONDEO1_R))
            Line((-REDONDEO1_R * 0.02, -REDONDEO1_R), (-REDONDEO1_R * 0.02, REDONDEO1_R * 0.02))
            Line((-REDONDEO1_R * 0.02, REDONDEO1_R * 0.02), (REDONDEO1_R, REDONDEO1_R * 0.02))
            Line((REDONDEO1_R, REDONDEO1_R * 0.02), (REDONDEO1_R, 0))
        make_face()
    redondeo1_piece_17a = extrude(amount=16.5, mode=Mode.PRIVATE)
    redondeo1_piece_17a = split(redondeo1_piece_17a, bisect_by=Plane(origin=(7, -9.773604886, 22.773604886), z_dir=(-1, 0, 0)), keep=Keep.TOP, mode=Mode.PRIVATE)
    with BuildSketch(Plane(origin=(7, -33.3, 23), x_dir=(-1, 0, 0), z_dir=(0, 1, 0))) as redondeo1_piece_17b_section:
        with BuildLine():
            CenterArc((REDONDEO1_R, -REDONDEO1_R), REDONDEO1_R, 90, 90)
            Line((0, -REDONDEO1_R), (-REDONDEO1_R * 0.02, -REDONDEO1_R))
            Line((-REDONDEO1_R * 0.02, -REDONDEO1_R), (-REDONDEO1_R * 0.02, REDONDEO1_R * 0.02))
            Line((-REDONDEO1_R * 0.02, REDONDEO1_R * 0.02), (REDONDEO1_R, REDONDEO1_R * 0.02))
            Line((REDONDEO1_R, REDONDEO1_R * 0.02), (REDONDEO1_R, 0))
        make_face()
    redondeo1_piece_17b = extrude(amount=25.8, mode=Mode.PRIVATE)
    redondeo1_piece_17b = split(redondeo1_piece_17b, bisect_by=Plane(origin=(6.773604886, -10, 22.773604886), z_dir=(0, 1, 0)), keep=Keep.TOP, mode=Mode.PRIVATE)
    redondeo1_piece_17 = redondeo1_piece_17a & redondeo1_piece_17b
    add(redondeo1_piece_17, mode=Mode.SUBTRACT)
    with BuildSketch(Plane(origin=(0, -33.3, -7), x_dir=(0, 1, 0), z_dir=(0, 0, 1))) as redondeo1_piece_18a_section:
        with BuildLine():
            CenterArc((REDONDEO1_R, REDONDEO1_R), REDONDEO1_R, 180, 90)
            Line((0, REDONDEO1_R), (-REDONDEO1_R * 0.02, REDONDEO1_R))
            Line((-REDONDEO1_R * 0.02, REDONDEO1_R), (-REDONDEO1_R * 0.02, -REDONDEO1_R * 0.02))
            Line((-REDONDEO1_R * 0.02, -REDONDEO1_R * 0.02), (REDONDEO1_R, -REDONDEO1_R * 0.02))
            Line((REDONDEO1_R, -REDONDEO1_R * 0.02), (REDONDEO1_R, 0))
        make_face()
    redondeo1_piece_18a = extrude(amount=9.5, mode=Mode.PRIVATE)
    redondeo1_piece_18a = split(redondeo1_piece_18a, bisect_by=Plane(origin=(-0.226395114, -33.073604886, 0), z_dir=(0, 0, 1)), keep=Keep.TOP, mode=Mode.PRIVATE)
    with BuildSketch(Plane(origin=(0, -30.8, 0), x_dir=(0, 0, 1), z_dir=(0, -1, 0))) as redondeo1_piece_18b_section:
        with BuildLine():
            CenterArc((REDONDEO1_R, REDONDEO1_R), REDONDEO1_R, 180, 90)
            Line((0, REDONDEO1_R), (-REDONDEO1_R * 0.02, REDONDEO1_R))
            Line((-REDONDEO1_R * 0.02, REDONDEO1_R), (-REDONDEO1_R * 0.02, -REDONDEO1_R * 0.02))
            Line((-REDONDEO1_R * 0.02, -REDONDEO1_R * 0.02), (REDONDEO1_R, -REDONDEO1_R * 0.02))
            Line((REDONDEO1_R, -REDONDEO1_R * 0.02), (REDONDEO1_R, 0))
        make_face()
    redondeo1_piece_18b = extrude(amount=13.5, mode=Mode.PRIVATE)
    redondeo1_piece_18b = split(redondeo1_piece_18b, bisect_by=Plane(origin=(-0.226395114, -33.3, 0.226395114), z_dir=(0, 1, 0)), keep=Keep.TOP, mode=Mode.PRIVATE)
    redondeo1_piece_18 = redondeo1_piece_18a & redondeo1_piece_18b
    add(redondeo1_piece_18, mode=Mode.SUBTRACT)
    with BuildSketch(Plane(origin=(0, -33.3, 0), x_dir=(0, 0, 1), z_dir=(0, -1, 0))) as redondeo1_piece_19a_section:
        with BuildLine():
            CenterArc((REDONDEO1_R, REDONDEO1_R), REDONDEO1_R, 180, 90)
            Line((0, REDONDEO1_R), (-REDONDEO1_R * 0.02, REDONDEO1_R))
            Line((-REDONDEO1_R * 0.02, REDONDEO1_R), (-REDONDEO1_R * 0.02, -REDONDEO1_R * 0.02))
            Line((-REDONDEO1_R * 0.02, -REDONDEO1_R * 0.02), (REDONDEO1_R, -REDONDEO1_R * 0.02))
            Line((REDONDEO1_R, -REDONDEO1_R * 0.02), (REDONDEO1_R, 0))
        make_face()
    redondeo1_piece_19a = extrude(amount=13.5, mode=Mode.PRIVATE)
    redondeo1_piece_19a = split(redondeo1_piece_19a, bisect_by=Plane(origin=(-0.226395114, -44.3, 0.226395114), z_dir=(0, -1, 0)), keep=Keep.TOP, mode=Mode.PRIVATE)
    with BuildSketch(Plane(origin=(0, -44.3, -2.5), x_dir=(0, 1, 0), z_dir=(0, 0, 1))) as redondeo1_piece_19b_section:
        with BuildLine():
            CenterArc((REDONDEO1_R, REDONDEO1_R), REDONDEO1_R, 180, 90)
            Line((0, REDONDEO1_R), (-REDONDEO1_R * 0.02, REDONDEO1_R))
            Line((-REDONDEO1_R * 0.02, REDONDEO1_R), (-REDONDEO1_R * 0.02, -REDONDEO1_R * 0.02))
            Line((-REDONDEO1_R * 0.02, -REDONDEO1_R * 0.02), (REDONDEO1_R, -REDONDEO1_R * 0.02))
            Line((REDONDEO1_R, -REDONDEO1_R * 0.02), (REDONDEO1_R, 0))
        make_face()
    redondeo1_piece_19b = extrude(amount=25.5, mode=Mode.PRIVATE)
    redondeo1_piece_19b = split(redondeo1_piece_19b, bisect_by=Plane(origin=(-0.226395114, -44.073604886, 0), z_dir=(0, 0, -1)), keep=Keep.TOP, mode=Mode.PRIVATE)
    redondeo1_piece_19 = redondeo1_piece_19a & redondeo1_piece_19b
    add(redondeo1_piece_19, mode=Mode.SUBTRACT)
    with BuildSketch(Plane(origin=(0, -10, -9.5), x_dir=(-1, 0, 0), z_dir=(0, 0, 1))) as redondeo1_piece_20a_section:
        with BuildLine():
            CenterArc((REDONDEO1_R, REDONDEO1_R), REDONDEO1_R, 180, 90)
            Line((0, REDONDEO1_R), (-REDONDEO1_R * 0.02, REDONDEO1_R))
            Line((-REDONDEO1_R * 0.02, REDONDEO1_R), (-REDONDEO1_R * 0.02, -REDONDEO1_R * 0.02))
            Line((-REDONDEO1_R * 0.02, -REDONDEO1_R * 0.02), (REDONDEO1_R, -REDONDEO1_R * 0.02))
            Line((REDONDEO1_R, -REDONDEO1_R * 0.02), (REDONDEO1_R, 0))
        make_face()
    redondeo1_piece_20a = extrude(amount=9.5, mode=Mode.PRIVATE)
    redondeo1_piece_20a = split(redondeo1_piece_20a, bisect_by=Plane(origin=(-0.226395114, -10.226395114, -7), z_dir=(0, 0, -1)), keep=Keep.TOP, mode=Mode.PRIVATE)
    with BuildSketch(Plane(origin=(0, -7.5, -7), x_dir=(0, 0, 1), z_dir=(0, -1, 0))) as redondeo1_piece_20b_section:
        with BuildLine():
            CenterArc((REDONDEO1_R, REDONDEO1_R), REDONDEO1_R, 180, 90)
            Line((0, REDONDEO1_R), (-REDONDEO1_R * 0.02, REDONDEO1_R))
            Line((-REDONDEO1_R * 0.02, REDONDEO1_R), (-REDONDEO1_R * 0.02, -REDONDEO1_R * 0.02))
            Line((-REDONDEO1_R * 0.02, -REDONDEO1_R * 0.02), (REDONDEO1_R, -REDONDEO1_R * 0.02))
            Line((REDONDEO1_R, -REDONDEO1_R * 0.02), (REDONDEO1_R, 0))
        make_face()
    redondeo1_piece_20b = extrude(amount=25.8, mode=Mode.PRIVATE)
    redondeo1_piece_20b = split(redondeo1_piece_20b, bisect_by=Plane(origin=(-0.226395114, -10, -6.773604886), z_dir=(0, 1, 0)), keep=Keep.TOP, mode=Mode.PRIVATE)
    redondeo1_piece_20 = redondeo1_piece_20a & redondeo1_piece_20b
    add(redondeo1_piece_20, mode=Mode.SUBTRACT)
    with BuildSketch(Plane(origin=(0, -10, -7), x_dir=(0, 0, 1), z_dir=(0, -1, 0))) as redondeo1_piece_21a_section:
        with BuildLine():
            CenterArc((REDONDEO1_R, REDONDEO1_R), REDONDEO1_R, 180, 90)
            Line((0, REDONDEO1_R), (-REDONDEO1_R * 0.02, REDONDEO1_R))
            Line((-REDONDEO1_R * 0.02, REDONDEO1_R), (-REDONDEO1_R * 0.02, -REDONDEO1_R * 0.02))
            Line((-REDONDEO1_R * 0.02, -REDONDEO1_R * 0.02), (REDONDEO1_R, -REDONDEO1_R * 0.02))
            Line((REDONDEO1_R, -REDONDEO1_R * 0.02), (REDONDEO1_R, 0))
        make_face()
    redondeo1_piece_21a = extrude(amount=25.8, mode=Mode.PRIVATE)
    redondeo1_piece_21a = split(redondeo1_piece_21a, bisect_by=Plane(origin=(-0.226395114, -33.3, -6.773604886), z_dir=(0, -1, 0)), keep=Keep.TOP, mode=Mode.PRIVATE)
    with BuildSketch(Plane(origin=(0, -33.3, -9.5), x_dir=(0, 1, 0), z_dir=(0, 0, 1))) as redondeo1_piece_21b_section:
        with BuildLine():
            CenterArc((REDONDEO1_R, REDONDEO1_R), REDONDEO1_R, 180, 90)
            Line((0, REDONDEO1_R), (-REDONDEO1_R * 0.02, REDONDEO1_R))
            Line((-REDONDEO1_R * 0.02, REDONDEO1_R), (-REDONDEO1_R * 0.02, -REDONDEO1_R * 0.02))
            Line((-REDONDEO1_R * 0.02, -REDONDEO1_R * 0.02), (REDONDEO1_R, -REDONDEO1_R * 0.02))
            Line((REDONDEO1_R, -REDONDEO1_R * 0.02), (REDONDEO1_R, 0))
        make_face()
    redondeo1_piece_21b = extrude(amount=9.5, mode=Mode.PRIVATE)
    redondeo1_piece_21b = split(redondeo1_piece_21b, bisect_by=Plane(origin=(-0.226395114, -33.073604886, -7), z_dir=(0, 0, -1)), keep=Keep.TOP, mode=Mode.PRIVATE)
    redondeo1_piece_21 = redondeo1_piece_21a & redondeo1_piece_21b
    add(redondeo1_piece_21, mode=Mode.SUBTRACT)

    # Croquis19 → Cortar-Extruir10 (cut, through all)
    with BuildSketch(Plane(origin=(0, -44.3, 0), x_dir=(-1, 0, 0), z_dir=(0, -1, 0))):
        Polygon((-24, -11.5), (1, -11.5), (1, 0), (3, 0), (3, 7), (-24, 7), align=None)
        with Locations((2, -5.75)):
            Rectangle(CROQUIS19_W, CROQUIS19_H)
    extrude(amount=-CORTAR_EXTRUIR10_DEPTH, mode=Mode.SUBTRACT)

    # Croquis20 → Cortar-Extruir11 (cut, through all)
    with BuildSketch(Plane(origin=(24, 0, 0), x_dir=(0, 0, -1), z_dir=(1, 0, 0))):
        with Locations((-17.25, -38.8)):
            Rectangle(CROQUIS20_W, CROQUIS20_H)
    extrude(amount=-CORTAR_EXTRUIR11_DEPTH, mode=Mode.SUBTRACT)


solid = part_1.part
